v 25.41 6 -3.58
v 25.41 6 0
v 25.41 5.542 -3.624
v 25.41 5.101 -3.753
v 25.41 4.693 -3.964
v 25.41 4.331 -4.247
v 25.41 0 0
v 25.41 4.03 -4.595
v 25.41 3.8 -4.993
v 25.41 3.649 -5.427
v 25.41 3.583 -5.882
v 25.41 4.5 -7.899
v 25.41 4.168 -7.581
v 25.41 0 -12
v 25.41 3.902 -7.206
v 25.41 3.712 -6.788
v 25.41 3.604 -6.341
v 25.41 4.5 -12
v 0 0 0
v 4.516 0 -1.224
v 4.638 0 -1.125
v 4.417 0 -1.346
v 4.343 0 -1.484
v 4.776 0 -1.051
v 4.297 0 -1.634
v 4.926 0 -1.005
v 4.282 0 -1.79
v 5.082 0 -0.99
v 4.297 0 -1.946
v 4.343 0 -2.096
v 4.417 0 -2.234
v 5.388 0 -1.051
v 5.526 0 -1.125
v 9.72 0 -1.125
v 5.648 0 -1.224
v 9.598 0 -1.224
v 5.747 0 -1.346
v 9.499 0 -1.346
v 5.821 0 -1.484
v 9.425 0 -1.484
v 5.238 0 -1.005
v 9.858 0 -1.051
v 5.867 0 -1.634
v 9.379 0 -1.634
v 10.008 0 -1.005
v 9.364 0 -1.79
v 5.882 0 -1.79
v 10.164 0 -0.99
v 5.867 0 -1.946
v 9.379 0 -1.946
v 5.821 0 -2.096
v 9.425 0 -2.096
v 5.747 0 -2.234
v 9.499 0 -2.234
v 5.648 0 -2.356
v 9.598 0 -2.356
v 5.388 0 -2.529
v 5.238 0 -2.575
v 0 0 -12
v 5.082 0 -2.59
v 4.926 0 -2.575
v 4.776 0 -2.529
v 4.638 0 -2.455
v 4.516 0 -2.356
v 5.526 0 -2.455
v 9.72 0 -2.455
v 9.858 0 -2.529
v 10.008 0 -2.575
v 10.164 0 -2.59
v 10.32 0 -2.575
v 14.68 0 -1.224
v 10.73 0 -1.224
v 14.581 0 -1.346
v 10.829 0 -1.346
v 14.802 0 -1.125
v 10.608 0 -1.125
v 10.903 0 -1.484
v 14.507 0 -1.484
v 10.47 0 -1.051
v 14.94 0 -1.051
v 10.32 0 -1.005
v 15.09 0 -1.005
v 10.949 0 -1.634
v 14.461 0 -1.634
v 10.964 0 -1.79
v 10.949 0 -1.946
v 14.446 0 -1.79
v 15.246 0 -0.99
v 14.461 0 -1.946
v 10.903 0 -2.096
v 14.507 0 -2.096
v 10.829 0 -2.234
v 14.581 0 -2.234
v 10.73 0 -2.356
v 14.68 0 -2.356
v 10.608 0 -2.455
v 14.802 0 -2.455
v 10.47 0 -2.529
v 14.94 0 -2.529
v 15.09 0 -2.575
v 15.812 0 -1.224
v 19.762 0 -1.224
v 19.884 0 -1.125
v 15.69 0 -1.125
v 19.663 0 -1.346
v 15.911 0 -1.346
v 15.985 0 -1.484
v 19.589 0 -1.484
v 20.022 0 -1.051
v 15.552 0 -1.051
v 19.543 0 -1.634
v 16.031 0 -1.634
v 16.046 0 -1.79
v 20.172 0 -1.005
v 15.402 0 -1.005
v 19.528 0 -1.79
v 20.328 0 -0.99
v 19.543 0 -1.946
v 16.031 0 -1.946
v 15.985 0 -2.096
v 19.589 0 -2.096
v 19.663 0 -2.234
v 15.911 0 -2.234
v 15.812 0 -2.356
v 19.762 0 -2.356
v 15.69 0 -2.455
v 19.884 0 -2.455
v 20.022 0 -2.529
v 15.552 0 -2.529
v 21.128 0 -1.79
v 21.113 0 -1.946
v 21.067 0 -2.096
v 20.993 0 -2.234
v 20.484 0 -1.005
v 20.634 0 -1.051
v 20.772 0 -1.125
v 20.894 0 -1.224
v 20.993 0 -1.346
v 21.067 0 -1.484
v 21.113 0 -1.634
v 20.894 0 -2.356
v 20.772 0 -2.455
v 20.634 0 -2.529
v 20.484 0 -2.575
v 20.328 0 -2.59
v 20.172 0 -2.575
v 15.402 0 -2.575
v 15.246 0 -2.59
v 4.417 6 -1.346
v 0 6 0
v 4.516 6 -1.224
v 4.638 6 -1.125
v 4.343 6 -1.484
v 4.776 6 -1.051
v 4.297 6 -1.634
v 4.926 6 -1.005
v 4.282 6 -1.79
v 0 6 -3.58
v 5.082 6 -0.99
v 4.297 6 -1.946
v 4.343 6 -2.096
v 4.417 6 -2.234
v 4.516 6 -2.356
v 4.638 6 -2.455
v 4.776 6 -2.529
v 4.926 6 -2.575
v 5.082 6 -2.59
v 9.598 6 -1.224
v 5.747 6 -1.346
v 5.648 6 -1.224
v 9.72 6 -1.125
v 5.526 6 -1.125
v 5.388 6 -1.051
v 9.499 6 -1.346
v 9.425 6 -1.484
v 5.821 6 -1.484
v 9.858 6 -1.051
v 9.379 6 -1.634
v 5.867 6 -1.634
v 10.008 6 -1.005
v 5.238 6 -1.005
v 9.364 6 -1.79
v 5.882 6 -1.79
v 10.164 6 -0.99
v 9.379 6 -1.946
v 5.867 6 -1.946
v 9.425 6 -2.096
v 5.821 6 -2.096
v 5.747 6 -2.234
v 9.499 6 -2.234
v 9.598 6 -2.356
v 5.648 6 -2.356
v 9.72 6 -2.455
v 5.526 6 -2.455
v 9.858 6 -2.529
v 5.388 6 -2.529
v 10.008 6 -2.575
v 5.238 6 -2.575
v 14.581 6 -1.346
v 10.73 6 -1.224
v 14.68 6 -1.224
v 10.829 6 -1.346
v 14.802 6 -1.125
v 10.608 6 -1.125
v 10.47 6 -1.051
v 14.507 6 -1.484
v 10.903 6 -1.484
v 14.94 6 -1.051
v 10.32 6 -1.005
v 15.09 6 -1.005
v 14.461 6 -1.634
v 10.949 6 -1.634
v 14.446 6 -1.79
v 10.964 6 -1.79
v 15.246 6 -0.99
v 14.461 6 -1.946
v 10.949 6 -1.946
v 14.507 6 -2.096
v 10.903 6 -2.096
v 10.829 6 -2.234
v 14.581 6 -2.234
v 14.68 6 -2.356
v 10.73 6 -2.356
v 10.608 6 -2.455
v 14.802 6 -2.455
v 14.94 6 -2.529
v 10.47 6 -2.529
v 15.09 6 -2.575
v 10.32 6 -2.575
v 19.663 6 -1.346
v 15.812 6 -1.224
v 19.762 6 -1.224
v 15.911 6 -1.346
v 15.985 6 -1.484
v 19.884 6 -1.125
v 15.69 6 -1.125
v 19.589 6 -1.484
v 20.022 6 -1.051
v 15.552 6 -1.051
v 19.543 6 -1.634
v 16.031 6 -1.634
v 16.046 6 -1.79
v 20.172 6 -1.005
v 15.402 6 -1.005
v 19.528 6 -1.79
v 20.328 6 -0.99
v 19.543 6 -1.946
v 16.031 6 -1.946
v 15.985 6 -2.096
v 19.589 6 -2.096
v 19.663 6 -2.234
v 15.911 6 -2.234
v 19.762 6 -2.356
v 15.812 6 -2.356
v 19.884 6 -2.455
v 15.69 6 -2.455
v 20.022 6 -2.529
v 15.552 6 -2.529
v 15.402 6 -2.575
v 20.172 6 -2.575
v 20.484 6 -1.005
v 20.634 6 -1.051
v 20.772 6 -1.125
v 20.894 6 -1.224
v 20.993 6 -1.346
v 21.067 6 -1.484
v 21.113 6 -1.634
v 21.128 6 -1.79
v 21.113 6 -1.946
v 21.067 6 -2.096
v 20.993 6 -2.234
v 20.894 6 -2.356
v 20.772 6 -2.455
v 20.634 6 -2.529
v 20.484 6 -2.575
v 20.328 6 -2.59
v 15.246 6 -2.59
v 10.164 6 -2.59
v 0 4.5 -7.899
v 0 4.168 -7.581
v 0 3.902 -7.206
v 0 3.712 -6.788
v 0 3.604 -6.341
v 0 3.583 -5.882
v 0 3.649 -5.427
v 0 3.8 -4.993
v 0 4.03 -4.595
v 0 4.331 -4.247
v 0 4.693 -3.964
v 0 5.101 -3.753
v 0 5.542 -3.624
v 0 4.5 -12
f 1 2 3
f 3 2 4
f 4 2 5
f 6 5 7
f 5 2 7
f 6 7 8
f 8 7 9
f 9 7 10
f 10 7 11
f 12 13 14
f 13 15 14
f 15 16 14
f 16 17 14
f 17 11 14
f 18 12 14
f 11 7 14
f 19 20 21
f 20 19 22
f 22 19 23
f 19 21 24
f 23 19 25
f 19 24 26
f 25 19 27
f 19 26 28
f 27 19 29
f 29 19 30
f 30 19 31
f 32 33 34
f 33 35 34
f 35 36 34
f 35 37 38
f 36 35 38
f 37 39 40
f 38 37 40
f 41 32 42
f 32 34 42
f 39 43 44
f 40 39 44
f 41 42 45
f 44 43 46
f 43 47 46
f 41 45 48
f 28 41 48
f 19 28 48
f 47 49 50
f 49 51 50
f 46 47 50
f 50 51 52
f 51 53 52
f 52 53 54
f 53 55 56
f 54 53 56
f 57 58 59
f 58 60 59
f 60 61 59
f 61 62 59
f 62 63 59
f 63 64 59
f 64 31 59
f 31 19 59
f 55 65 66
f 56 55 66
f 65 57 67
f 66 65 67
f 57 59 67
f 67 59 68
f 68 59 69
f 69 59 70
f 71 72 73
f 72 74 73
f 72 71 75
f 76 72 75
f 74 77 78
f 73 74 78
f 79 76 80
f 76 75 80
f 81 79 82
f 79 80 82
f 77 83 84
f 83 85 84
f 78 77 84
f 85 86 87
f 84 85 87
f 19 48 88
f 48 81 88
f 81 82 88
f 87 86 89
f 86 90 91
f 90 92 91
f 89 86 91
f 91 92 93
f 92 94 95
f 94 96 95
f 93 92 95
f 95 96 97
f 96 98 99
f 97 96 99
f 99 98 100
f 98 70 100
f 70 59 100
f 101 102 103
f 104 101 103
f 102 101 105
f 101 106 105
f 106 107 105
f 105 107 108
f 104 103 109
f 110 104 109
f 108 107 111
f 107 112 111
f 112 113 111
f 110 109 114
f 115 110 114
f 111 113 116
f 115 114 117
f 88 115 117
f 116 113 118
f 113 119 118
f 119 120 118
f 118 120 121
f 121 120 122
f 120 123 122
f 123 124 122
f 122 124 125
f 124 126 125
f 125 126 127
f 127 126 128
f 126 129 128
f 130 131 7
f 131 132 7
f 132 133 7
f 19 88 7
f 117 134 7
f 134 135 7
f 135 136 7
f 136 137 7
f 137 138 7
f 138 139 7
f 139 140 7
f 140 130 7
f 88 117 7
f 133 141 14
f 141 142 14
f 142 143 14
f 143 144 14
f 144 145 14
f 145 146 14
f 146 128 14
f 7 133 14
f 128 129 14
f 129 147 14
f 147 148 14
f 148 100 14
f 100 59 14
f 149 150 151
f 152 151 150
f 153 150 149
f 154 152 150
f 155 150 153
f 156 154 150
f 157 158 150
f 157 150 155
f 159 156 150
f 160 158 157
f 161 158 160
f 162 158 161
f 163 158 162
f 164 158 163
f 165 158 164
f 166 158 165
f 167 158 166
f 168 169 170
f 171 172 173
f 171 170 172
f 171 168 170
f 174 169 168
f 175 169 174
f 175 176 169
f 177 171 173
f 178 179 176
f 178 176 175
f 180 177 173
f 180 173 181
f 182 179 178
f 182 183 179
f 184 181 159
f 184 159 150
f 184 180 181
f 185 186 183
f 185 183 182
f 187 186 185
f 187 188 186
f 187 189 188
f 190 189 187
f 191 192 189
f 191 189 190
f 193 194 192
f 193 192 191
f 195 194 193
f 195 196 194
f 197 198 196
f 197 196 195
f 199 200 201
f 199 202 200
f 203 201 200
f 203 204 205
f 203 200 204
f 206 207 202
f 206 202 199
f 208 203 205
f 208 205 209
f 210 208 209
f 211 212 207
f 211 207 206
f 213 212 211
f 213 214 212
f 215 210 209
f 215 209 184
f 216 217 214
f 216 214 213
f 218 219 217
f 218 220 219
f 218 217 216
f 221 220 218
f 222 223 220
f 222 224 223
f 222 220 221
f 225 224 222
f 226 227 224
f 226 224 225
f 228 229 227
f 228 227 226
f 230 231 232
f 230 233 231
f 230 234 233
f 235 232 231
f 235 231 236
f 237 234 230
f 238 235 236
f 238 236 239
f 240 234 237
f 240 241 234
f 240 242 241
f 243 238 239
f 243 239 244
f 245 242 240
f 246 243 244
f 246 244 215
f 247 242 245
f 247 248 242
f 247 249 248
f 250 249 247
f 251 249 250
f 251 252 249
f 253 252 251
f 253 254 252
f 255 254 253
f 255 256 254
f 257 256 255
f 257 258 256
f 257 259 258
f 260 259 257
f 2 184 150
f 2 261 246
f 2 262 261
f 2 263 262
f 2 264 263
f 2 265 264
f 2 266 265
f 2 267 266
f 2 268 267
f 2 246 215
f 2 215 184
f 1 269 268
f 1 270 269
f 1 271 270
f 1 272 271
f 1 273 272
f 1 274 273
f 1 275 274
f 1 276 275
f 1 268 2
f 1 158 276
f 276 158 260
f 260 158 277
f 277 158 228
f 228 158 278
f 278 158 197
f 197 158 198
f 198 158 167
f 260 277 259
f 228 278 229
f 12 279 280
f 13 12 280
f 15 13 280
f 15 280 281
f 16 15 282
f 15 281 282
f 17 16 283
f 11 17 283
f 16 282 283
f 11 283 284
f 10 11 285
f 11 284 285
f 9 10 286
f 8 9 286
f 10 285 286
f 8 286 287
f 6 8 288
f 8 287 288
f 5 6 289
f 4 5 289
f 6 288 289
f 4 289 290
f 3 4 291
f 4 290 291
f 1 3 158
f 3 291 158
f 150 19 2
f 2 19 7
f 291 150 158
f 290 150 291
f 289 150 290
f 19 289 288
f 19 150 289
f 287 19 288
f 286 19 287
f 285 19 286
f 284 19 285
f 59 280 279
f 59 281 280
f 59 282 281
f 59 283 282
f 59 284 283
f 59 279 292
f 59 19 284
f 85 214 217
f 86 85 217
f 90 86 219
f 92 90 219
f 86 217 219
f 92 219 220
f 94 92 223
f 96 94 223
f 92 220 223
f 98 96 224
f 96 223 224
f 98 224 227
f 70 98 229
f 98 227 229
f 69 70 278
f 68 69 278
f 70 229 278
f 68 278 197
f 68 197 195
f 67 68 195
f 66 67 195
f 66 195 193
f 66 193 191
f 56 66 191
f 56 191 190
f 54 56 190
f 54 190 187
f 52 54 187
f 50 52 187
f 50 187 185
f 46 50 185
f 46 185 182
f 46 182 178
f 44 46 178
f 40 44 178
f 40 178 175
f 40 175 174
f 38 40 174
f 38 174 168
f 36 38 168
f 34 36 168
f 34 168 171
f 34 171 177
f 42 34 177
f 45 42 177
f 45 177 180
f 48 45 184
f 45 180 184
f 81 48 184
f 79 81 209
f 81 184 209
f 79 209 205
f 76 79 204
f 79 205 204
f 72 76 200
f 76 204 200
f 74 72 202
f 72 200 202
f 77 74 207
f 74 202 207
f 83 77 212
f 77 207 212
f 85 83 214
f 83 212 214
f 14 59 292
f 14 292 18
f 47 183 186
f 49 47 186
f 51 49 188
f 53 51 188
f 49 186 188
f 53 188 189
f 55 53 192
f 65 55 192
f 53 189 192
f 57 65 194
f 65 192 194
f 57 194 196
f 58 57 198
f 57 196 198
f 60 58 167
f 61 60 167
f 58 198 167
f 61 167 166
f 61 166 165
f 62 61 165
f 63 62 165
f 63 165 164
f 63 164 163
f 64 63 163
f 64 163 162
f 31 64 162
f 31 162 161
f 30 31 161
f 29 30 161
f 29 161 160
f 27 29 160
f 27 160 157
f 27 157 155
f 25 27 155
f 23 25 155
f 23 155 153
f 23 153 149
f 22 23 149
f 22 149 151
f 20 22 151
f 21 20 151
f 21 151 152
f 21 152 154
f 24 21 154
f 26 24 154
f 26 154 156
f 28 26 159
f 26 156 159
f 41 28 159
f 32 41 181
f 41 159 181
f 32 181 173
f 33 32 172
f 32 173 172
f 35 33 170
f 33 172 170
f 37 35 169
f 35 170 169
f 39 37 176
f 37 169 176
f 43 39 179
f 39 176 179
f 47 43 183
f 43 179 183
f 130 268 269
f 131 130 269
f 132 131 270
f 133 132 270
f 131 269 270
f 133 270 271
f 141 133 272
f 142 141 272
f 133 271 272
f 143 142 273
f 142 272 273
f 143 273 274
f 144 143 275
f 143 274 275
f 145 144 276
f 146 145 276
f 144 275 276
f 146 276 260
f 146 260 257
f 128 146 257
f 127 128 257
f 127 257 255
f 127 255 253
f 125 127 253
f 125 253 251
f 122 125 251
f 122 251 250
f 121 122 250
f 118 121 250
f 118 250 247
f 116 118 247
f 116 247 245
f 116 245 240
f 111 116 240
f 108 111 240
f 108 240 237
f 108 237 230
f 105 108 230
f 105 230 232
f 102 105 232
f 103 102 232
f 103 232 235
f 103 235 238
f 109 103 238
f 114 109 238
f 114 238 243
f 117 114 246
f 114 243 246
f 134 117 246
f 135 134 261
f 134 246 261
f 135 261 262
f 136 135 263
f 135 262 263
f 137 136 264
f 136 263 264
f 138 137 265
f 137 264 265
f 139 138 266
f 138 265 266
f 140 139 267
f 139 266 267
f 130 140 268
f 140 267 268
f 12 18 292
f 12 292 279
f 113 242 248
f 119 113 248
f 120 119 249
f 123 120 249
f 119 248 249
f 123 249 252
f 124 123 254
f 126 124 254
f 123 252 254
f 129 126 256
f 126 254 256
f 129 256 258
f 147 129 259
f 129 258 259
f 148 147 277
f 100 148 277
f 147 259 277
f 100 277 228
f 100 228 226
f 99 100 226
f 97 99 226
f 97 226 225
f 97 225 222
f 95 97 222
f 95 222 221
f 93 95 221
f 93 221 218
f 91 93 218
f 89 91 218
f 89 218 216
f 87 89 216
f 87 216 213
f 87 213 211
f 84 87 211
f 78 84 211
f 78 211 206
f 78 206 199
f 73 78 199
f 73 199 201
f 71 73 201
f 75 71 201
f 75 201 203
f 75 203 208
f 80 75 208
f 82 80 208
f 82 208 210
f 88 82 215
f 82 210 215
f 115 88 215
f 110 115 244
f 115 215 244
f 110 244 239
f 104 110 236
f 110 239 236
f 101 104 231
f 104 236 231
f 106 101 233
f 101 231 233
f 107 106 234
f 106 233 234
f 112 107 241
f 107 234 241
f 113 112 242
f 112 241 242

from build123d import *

# Parameters (mm, degrees)
SKETCH1_W           = 25.41
SKETCH1_H           = 12
BOSS_EXTRUDE1_DEPTH = 6
SKETCH2_R           = 2.42
CUT_EXTRUDE1_DEPTH  = 25.41
SKETCH3_W           = 4.543452961
SKETCH3_H           = 1.5
CUT_EXTRUDE2_DEPTH  = 25.41
SKETCH4_R           = 0.8
CUT_EXTRUDE4_DEPTH  = 7


with BuildPart() as part:
    # Sketch1 → Boss-Extrude1 (new body)
    with BuildSketch(Plane(origin=(0, 0, 0), x_dir=(1, 0, 0), z_dir=(0, 1, 0))):
        with Locations((12.705, 6)):
            Rectangle(SKETCH1_W, SKETCH1_H)
    extrude(amount=BOSS_EXTRUDE1_DEPTH)

    # Sketch2 → Cut-Extrude1 (cut)
    with BuildSketch(Plane.ZY):
        with Locations((-6, 6)):
            Circle(SKETCH2_R)
    extrude(amount=-CUT_EXTRUDE1_DEPTH, mode=Mode.SUBTRACT)

    # Sketch3 → Cut-Extrude2 (cut)
    with BuildSketch(Plane.ZY):
        with Locations((-9.72827352, 5.25)):
            Rectangle(SKETCH3_W, SKETCH3_H)
    extrude(amount=-CUT_EXTRUDE2_DEPTH, mode=Mode.SUBTRACT)

    # Sketch4 → Cut-Extrude4 (cut, through all)
    with BuildSketch(Plane(origin=(0, 6, 0), x_dir=(1, 0, 0), z_dir=(0, 1, 0))):
        with Locations((5.082, 1.79)):
            Circle(SKETCH4_R)
        with Locations((10.164, 1.79)):
            Circle(SKETCH4_R)
        with Locations((15.246, 1.79)):
            Circle(SKETCH4_R)
        with Locations((20.328, 1.79)):
            Circle(SKETCH4_R)
    extrude(amount=-CUT_EXTRUDE4_DEPTH, mode=Mode.SUBTRACT)


solid = part.part
